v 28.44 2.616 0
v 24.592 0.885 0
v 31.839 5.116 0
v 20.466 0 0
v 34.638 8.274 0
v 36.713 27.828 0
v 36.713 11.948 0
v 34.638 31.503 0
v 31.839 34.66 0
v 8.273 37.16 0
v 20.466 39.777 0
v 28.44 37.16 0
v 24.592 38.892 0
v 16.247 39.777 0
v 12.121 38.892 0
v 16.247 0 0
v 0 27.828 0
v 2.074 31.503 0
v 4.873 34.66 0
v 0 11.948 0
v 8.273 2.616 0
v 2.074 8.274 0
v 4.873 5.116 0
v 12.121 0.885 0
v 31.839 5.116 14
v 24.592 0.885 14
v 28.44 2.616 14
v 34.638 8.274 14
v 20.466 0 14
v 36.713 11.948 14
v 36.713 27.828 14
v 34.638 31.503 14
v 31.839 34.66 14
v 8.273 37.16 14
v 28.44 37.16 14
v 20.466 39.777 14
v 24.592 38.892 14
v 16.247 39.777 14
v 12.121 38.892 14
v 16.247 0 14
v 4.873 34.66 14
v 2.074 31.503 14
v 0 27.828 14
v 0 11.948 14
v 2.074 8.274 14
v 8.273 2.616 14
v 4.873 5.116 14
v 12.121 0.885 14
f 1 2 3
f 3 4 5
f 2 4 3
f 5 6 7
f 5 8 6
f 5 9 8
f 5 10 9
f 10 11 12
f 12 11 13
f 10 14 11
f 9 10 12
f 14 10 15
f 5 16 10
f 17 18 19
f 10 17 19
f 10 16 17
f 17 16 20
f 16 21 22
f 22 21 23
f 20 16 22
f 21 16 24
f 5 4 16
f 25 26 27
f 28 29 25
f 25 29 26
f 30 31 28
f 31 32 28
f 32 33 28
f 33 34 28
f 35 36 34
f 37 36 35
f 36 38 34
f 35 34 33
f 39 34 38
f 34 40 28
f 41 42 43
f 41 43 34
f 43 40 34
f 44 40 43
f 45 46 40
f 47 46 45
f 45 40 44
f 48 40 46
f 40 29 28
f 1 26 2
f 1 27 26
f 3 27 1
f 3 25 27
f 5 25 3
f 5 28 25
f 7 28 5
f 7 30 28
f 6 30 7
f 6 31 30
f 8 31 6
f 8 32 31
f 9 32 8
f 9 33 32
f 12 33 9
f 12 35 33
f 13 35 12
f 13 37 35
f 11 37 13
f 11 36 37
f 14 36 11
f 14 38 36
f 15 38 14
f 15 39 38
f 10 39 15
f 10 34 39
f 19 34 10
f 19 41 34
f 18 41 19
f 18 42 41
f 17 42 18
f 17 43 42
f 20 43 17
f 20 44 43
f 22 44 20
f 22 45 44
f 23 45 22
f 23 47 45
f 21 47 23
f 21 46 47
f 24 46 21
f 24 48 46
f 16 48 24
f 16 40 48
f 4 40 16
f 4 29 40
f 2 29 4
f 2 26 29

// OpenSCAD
$fn = 32;

// ----------------------------------------------------------------------
// Flat adaptor: double_d, 14 mm thick
// ----------------------------------------------------------------------

// --- parameters (mm) ---
profile_height = 14;      // extrusion height
profile_points = 24;      // points of the closed outline

profile = [[36.713, 27.828], [34.638, 31.503], [31.839, 34.66], [28.44, 37.16], [24.592, 38.892], [20.466, 39.777], [16.247, 39.777], [12.121, 38.892], [8.273, 37.16], [4.873, 34.66], [2.074, 31.503], [0, 27.828], [0, 11.948], [2.074, 8.274], [4.873, 5.116], [8.273, 2.616], [12.121, 0.885], [16.247, 0], [20.466, 0], [24.592, 0.885], [28.44, 2.616], [31.839, 5.116], [34.638, 8.274], [36.713, 11.948]];  // single closed polygon, 24 points, counter clockwise

// --- the one profile operation ---
linear_extrude(height = profile_height) polygon(points = profile);
